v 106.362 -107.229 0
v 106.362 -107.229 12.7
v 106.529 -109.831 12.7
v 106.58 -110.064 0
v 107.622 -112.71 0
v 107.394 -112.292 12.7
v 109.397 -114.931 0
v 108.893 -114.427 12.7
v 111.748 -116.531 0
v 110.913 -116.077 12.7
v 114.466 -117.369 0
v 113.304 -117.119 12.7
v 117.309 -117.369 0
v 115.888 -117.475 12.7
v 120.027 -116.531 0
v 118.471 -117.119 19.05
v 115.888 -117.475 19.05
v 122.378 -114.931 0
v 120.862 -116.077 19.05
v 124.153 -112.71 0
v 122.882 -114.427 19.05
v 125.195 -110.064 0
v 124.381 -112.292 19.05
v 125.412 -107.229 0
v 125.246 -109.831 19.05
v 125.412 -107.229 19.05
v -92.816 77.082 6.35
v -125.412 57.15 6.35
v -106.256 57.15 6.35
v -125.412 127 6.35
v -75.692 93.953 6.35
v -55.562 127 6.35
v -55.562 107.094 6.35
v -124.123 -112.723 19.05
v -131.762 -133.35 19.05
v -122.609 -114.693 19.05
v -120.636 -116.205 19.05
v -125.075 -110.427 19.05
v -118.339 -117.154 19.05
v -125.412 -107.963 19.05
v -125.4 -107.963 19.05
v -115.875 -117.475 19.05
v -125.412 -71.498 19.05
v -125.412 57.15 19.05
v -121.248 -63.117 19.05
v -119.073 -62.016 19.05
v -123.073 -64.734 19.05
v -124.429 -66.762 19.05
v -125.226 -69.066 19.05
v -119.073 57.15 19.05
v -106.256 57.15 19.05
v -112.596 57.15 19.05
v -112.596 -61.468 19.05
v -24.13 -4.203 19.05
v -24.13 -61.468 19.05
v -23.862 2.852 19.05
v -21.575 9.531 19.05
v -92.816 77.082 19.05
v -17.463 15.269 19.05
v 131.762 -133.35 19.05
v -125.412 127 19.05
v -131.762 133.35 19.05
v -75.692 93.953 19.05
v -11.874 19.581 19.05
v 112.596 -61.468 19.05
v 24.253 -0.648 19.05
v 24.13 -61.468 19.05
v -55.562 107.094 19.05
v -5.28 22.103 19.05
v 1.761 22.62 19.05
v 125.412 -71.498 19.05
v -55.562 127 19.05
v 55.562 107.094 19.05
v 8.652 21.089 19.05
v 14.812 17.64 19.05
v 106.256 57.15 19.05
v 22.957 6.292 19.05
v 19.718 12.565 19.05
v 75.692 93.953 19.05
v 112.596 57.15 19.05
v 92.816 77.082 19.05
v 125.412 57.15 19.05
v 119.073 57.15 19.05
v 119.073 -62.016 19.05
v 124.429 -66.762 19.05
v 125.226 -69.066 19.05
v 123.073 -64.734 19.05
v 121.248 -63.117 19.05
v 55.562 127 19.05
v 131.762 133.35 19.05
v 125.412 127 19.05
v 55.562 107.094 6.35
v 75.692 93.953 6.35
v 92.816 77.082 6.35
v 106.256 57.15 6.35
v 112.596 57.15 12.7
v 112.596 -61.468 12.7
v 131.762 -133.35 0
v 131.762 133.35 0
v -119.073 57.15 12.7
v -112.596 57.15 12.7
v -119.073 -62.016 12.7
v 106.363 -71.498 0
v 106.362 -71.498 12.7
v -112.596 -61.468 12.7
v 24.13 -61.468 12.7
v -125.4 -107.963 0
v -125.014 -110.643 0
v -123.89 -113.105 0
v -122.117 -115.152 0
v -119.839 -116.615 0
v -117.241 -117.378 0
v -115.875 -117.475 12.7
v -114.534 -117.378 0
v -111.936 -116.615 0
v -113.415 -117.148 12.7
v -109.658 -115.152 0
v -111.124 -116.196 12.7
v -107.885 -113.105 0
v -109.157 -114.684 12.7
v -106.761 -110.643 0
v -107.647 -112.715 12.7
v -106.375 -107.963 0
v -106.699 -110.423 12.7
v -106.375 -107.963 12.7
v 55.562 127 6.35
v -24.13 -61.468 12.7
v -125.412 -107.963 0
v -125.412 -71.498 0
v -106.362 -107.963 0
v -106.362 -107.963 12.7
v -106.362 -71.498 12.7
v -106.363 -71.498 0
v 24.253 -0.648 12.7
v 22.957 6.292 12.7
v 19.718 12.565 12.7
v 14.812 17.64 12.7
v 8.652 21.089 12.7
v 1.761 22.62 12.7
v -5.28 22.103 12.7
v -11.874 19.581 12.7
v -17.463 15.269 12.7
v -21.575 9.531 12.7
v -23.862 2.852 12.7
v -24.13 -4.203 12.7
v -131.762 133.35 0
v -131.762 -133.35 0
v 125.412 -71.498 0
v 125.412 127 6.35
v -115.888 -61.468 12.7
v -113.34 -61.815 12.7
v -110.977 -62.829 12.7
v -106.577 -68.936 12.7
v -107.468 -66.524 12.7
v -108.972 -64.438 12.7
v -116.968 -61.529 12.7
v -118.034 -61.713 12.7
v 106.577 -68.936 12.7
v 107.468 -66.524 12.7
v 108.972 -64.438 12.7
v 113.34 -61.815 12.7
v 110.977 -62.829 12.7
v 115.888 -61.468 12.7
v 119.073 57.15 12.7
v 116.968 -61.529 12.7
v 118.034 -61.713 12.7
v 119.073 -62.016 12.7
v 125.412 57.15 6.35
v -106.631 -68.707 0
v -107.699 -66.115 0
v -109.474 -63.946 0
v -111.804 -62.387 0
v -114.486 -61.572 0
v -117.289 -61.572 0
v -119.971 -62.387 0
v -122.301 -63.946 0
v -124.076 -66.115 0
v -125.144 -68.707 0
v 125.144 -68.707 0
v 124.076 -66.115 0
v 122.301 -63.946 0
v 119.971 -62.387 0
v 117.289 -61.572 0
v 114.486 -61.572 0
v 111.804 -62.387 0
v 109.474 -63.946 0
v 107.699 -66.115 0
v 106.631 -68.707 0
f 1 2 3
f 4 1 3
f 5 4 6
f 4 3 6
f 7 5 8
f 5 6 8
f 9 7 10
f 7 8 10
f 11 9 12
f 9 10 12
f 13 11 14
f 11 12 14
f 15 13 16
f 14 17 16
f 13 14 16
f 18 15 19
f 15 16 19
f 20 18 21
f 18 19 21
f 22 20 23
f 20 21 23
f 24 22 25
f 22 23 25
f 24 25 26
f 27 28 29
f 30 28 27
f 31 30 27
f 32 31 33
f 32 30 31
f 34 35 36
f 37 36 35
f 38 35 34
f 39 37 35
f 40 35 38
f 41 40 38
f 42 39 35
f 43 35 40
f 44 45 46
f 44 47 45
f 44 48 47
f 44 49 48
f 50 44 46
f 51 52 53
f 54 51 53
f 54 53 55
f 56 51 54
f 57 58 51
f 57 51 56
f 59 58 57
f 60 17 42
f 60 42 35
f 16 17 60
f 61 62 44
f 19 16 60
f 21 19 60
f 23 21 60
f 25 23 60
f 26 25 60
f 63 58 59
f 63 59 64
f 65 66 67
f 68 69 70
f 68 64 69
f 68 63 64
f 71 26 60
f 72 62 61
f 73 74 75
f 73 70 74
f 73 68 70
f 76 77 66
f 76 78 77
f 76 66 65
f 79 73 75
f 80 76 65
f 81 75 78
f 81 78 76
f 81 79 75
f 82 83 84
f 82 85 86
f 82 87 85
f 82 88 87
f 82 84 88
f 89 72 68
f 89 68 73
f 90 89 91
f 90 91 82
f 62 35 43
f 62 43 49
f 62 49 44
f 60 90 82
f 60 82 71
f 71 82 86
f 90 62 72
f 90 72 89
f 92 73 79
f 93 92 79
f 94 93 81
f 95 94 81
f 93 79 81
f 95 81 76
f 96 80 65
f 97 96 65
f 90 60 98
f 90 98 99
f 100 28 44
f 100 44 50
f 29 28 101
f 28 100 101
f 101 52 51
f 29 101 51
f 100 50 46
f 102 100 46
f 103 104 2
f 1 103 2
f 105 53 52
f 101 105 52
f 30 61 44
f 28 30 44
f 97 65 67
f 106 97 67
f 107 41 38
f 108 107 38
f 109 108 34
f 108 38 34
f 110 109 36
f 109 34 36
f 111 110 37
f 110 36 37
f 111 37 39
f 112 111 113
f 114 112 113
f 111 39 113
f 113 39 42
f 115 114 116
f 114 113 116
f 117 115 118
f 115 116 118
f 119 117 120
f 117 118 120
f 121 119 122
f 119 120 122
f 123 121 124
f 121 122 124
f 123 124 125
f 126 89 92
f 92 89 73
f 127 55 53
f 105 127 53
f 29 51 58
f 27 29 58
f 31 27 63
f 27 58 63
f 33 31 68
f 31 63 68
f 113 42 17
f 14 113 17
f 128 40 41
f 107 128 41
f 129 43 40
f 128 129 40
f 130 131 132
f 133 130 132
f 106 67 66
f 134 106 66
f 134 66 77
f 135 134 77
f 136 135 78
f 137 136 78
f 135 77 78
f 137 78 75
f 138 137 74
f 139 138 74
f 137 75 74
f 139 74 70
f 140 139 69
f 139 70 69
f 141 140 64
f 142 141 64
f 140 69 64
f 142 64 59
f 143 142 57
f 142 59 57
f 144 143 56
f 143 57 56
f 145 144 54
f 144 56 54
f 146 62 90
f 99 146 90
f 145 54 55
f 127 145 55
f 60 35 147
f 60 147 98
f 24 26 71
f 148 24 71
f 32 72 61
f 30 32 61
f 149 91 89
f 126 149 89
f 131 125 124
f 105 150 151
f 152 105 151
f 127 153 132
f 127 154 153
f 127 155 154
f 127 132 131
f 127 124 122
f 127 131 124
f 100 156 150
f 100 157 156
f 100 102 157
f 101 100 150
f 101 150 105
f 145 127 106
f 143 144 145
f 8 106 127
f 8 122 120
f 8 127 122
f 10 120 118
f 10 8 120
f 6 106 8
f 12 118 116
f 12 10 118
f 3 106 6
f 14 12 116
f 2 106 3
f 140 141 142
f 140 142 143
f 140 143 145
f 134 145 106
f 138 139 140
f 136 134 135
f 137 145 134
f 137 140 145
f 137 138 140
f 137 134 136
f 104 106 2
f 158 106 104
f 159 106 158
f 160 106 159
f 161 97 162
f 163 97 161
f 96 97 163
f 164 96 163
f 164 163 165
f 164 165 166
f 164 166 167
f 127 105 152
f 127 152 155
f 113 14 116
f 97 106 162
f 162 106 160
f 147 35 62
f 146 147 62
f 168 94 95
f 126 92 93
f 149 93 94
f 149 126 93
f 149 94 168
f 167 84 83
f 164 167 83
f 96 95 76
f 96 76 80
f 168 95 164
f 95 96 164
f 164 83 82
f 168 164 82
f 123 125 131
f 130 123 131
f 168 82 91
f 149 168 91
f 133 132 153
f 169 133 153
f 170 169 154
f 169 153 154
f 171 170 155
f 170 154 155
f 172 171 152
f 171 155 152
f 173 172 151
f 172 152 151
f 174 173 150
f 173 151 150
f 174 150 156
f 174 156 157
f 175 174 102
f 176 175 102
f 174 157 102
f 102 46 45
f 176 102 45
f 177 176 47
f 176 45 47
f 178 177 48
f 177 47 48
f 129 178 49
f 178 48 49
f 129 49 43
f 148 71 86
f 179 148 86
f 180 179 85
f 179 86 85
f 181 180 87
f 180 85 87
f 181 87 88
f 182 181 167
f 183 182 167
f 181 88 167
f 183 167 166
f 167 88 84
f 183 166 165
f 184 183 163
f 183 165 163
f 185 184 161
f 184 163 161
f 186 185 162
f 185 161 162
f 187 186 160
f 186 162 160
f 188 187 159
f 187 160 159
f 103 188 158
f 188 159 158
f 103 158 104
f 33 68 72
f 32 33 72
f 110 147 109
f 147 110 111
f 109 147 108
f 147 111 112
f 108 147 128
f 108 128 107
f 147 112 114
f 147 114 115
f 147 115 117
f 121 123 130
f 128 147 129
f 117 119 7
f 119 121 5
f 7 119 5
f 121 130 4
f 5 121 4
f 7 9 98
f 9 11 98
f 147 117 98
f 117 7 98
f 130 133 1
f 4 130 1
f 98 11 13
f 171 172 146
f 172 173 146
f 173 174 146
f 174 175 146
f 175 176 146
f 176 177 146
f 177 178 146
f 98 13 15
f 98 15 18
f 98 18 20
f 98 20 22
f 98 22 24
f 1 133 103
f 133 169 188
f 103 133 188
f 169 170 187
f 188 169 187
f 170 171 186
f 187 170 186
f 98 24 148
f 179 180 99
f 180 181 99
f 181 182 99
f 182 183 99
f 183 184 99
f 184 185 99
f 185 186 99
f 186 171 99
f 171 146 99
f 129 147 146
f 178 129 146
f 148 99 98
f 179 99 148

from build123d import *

# Parameters (mm, degrees)
F0_W      = 269.875
F0_H      = 273.05
F1_DEPTH  = 19.05
F3_DEPTH  = 12.7
F5_DEPTH  = 19.05
F6_W      = 3.175
F6_H      = 273.05
F7_DEPTH  = 19.05
F8_W      = 263.525
F8_H      = 3.175
F9_DEPTH  = 19.05
F11_DEPTH = 6.35
F13_DEPTH = 6.35
F14_W     = 263.525
F14_H     = 3.175
F15_DEPTH = 19.05


# Not quite as in the source:
# - ends of sketch curves that miss each other by under 0.0002 mm in the source are joined


with BuildPart() as f1:
    # F0 (on Top) → F1 (new body)
    with BuildSketch(Plane.XY):
        Rectangle(F0_W, F0_H)
    extrude(amount=F1_DEPTH)

    # F2 (on face) → F3 (cut)
    with BuildSketch(Plane.XY.offset(19.05)):
        with BuildLine():
            ThreePointArc((55.5625, 107.0944960946), (84.6752951993, 85.9448479137), (106.2558233698, 57.15))
            Line((106.2558233698, 57.15), (125.4125, 57.15))
            Line((125.4125, 57.15), (125.4125, 127))
            Line((125.4125, 127), (55.5625, 127))
            Line((55.5625, 127), (55.5625, 107.0944960946))
        make_face()
        with BuildLine():
            Line((-125.4125, 57.15), (-106.2558233698, 57.15))
            ThreePointArc((-106.2558233698, 57.15), (-84.6752951993, 85.9448479137), (-55.5625, 107.0944960946))
            Line((-55.5625, 107.0944960946), (-55.5625, 127))
            Line((-55.5625, 127), (-125.4125, 127))
            Line((-125.4125, 127), (-125.4125, 57.15))
        make_face()
    extrude(amount=-F3_DEPTH, mode=Mode.SUBTRACT)

    # F4 (on face) → F5 (cut, through all)
    with BuildSketch(Plane.XY.offset(19.05)):
        with BuildLine():
            Line((-106.3625, -107.9627), (-106.3625, -71.4977328139))
            ThreePointArc((-106.3625, -71.4977328139), (-115.8875, -61.468), (-125.4125, -71.4977328139))
            Line((-125.4125, -71.4977328139), (-125.4125, -107.9627))
            Line((-125.4125, -107.9627), (-125.3998, -107.9627))
            ThreePointArc((-125.3998, -107.9627), (-115.8875, -117.475), (-106.3752, -107.9627))
            Line((-106.3752, -107.9627), (-106.3625, -107.9627))
        make_face()
        with BuildLine():
            ThreePointArc((125.4125, -71.4977328139), (115.8875, -61.468), (106.3625, -71.4977328139))
            Line((106.3625, -71.4977328139), (106.3625, -107.228528768))
            ThreePointArc((106.3625, -107.228528768), (115.8875, -117.475), (125.4125, -107.228528768))
            Line((125.4125, -107.228528768), (125.4125, -71.4977328139))
        make_face()
    extrude(amount=-F5_DEPTH, mode=Mode.SUBTRACT)

    # F6 (on face) → F7 (cut, through all)
    with BuildSketch(Plane.XY.offset(19.05)):
        with Locations((-133.35, 0)):
            Rectangle(F6_W, F6_H)
        with Locations((133.35, 0)):
            Rectangle(F6_W, F6_H)
    extrude(amount=-F7_DEPTH, mode=Mode.SUBTRACT)

    # F8 (on face) → F9 (cut, through all)
    with BuildSketch(Plane.XY.offset(19.05)):
        with Locations((0, 134.9375)):
            Rectangle(F8_W, F8_H)
    extrude(amount=-F9_DEPTH, mode=Mode.SUBTRACT)

    # F10 (on face) → F11 (cut)
    with BuildSketch(Plane.XY.offset(19.05)):
        with BuildLine():
            Line((24.2490875216, -2.6255133905), (24.253090398, -0.6476470458))
            ThreePointArc((24.253090398, -0.6476470458), (-1.7785482929, 22.6185422911), (-24.13, -4.2026132727))
            Line((-24.13, -4.2026132727), (-24.13, -61.468))
            Line((-24.13, -61.468), (-115.8875, -61.468))
            ThreePointArc((-115.8875, -61.468), (-108.9715552829, -64.4377908989), (-106.3625, -71.4977328139))
            Line((-106.3625, -71.4977328139), (-106.3625, -107.9627))
            Line((-106.3625, -107.9627), (-106.3752, -107.9627))
            ThreePointArc((-106.3752, -107.9627), (-109.1568025344, -114.6844232103), (-115.8748084893, -117.4749915334))
            Line((-115.8748084893, -117.4749915334), (115.8875, -117.475))
            ThreePointArc((115.8875, -117.475), (108.892576882, -114.4269988445), (106.3625, -107.228528768))
            Line((106.3625, -107.228528768), (106.3625, -71.4977328139))
            ThreePointArc((106.3625, -71.4977328139), (108.9715552829, -64.4377908989), (115.8875, -61.468))
            Line((115.8875, -61.468), (24.13, -61.468))
            Line((24.13, -61.468), (24.2490875216, -2.6255133905))
        make_face()
    extrude(amount=-F11_DEPTH, mode=Mode.SUBTRACT)

    # F12 (on face) → F13 (cut)
    with BuildSketch(Plane.XY.offset(19.05)):
        with BuildLine():
            Line((119.0726616849, 57.15), (112.5956616849, 57.15))
            Line((112.5956616849, 57.15), (112.5956616849, -61.468))
            Line((112.5956616849, -61.468), (115.8875, -61.468))
            ThreePointArc((115.8875, -61.468), (117.5034429216, -61.6058888442), (119.0726616849, -62.0155683919))
            Line((119.0726616849, -62.0155683919), (119.0726616849, 57.15))
        make_face()
        with BuildLine():
            Line((-115.8341616849, -61.468), (-112.5956616849, -61.468))
            Line((-112.5956616849, -61.468), (-112.5956616849, 57.15))
            Line((-112.5956616849, 57.15), (-119.0726616849, 57.15))
            Line((-119.0726616849, 57.15), (-119.0726616849, -61.468))
            Line((-119.0726616849, -61.468), (-119.0726616849, -62.0155683919))
            ThreePointArc((-119.0726616849, -62.0155683919), (-117.4763944176, -61.6058567373), (-115.8341616849, -61.468))
        make_face()
    extrude(amount=-F13_DEPTH, mode=Mode.SUBTRACT)

    # F14 (on face) → F15 (cut, through all)
    with BuildSketch(Plane.XY.offset(19.05)):
        with Locations((0, -134.9375)):
            Rectangle(F14_W, F14_H)
    extrude(amount=-F15_DEPTH, mode=Mode.SUBTRACT)


solid = f1.part
